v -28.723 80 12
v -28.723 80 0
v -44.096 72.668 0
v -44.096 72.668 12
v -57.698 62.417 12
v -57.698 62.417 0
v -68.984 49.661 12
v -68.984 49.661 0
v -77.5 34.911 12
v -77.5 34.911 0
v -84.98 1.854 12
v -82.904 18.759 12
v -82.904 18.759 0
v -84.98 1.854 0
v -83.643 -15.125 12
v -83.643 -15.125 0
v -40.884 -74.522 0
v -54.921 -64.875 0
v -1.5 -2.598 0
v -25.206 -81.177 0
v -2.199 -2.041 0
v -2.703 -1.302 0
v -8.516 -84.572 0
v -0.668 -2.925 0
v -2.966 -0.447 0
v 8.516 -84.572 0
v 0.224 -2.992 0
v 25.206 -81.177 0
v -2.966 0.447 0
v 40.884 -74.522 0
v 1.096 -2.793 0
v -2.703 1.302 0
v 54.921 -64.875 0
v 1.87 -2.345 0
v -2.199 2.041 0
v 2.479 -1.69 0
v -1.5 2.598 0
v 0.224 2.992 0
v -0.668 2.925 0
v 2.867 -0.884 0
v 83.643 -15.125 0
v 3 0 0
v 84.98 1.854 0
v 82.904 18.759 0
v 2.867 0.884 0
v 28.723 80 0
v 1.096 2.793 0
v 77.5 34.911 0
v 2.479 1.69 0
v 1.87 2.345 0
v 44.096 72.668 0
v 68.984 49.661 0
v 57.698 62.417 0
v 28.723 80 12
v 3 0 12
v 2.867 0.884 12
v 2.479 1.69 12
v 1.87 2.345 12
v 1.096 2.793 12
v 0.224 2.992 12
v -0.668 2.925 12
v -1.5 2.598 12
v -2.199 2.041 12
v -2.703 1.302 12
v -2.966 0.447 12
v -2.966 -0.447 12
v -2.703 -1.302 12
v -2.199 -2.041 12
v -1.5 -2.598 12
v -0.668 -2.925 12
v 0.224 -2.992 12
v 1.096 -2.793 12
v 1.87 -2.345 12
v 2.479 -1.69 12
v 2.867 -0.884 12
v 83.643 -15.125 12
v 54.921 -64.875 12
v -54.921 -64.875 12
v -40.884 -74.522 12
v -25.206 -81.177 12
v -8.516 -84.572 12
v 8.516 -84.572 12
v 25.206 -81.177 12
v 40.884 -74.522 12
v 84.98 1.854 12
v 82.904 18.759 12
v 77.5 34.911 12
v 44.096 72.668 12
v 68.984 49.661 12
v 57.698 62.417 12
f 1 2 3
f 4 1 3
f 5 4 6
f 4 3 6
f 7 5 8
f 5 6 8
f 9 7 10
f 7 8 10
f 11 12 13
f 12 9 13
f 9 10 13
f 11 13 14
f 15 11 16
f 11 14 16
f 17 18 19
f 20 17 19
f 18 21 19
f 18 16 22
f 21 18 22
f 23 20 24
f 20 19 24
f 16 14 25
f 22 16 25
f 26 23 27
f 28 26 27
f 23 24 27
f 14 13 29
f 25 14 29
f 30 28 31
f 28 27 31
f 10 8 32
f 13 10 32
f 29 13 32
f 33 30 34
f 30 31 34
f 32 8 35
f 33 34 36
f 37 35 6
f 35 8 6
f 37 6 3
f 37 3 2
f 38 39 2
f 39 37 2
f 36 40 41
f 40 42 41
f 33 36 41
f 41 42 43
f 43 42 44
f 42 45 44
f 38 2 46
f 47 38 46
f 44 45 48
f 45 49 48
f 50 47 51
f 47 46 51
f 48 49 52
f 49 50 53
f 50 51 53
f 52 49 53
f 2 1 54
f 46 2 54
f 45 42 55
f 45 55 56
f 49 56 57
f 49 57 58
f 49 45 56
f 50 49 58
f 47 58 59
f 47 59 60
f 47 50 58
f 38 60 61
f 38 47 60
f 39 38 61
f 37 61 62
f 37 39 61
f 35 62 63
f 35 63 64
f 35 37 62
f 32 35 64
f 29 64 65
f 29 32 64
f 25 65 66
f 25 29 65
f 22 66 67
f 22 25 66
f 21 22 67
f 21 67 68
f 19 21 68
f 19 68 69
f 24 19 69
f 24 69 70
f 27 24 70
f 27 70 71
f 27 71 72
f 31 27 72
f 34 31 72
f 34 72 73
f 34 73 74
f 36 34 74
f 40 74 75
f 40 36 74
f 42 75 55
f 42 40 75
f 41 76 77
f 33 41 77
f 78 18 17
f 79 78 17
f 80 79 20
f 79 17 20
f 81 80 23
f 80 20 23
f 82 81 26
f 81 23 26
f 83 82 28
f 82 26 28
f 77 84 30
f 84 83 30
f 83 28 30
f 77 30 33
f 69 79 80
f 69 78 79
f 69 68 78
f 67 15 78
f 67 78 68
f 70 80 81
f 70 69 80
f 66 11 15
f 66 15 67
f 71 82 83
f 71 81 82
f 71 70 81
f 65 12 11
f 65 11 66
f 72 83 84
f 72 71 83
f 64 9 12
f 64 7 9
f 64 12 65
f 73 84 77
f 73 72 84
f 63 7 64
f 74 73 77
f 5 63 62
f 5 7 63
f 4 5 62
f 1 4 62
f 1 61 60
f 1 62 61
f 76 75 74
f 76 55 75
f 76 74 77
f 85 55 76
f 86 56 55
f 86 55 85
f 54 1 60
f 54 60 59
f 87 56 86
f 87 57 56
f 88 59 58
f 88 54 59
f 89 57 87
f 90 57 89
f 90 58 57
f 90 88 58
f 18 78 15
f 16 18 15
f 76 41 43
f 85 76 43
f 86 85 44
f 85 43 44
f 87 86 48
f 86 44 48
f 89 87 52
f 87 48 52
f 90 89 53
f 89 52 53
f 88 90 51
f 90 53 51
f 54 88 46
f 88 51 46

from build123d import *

# Parameters (mm, degrees)
SKETCH1_R           = 85
SKETCH1_R_2         = 3
BOSS_EXTRUDE1_DEPTH = 12
CUT_EXTRUDE1_DEPTH  = 12
CIRPATTERN1_COUNT   = 3


with BuildPart() as part:
    # Sketch1 → Boss-Extrude1 (new body)
    with BuildSketch(Plane.XY):
        Circle(SKETCH1_R)
        Circle(SKETCH1_R_2, mode=Mode.SUBTRACT)
    extrude(amount=BOSS_EXTRUDE1_DEPTH)

    # Sketch2 → Cut-Extrude1 (cut)
    with BuildSketch(Plane.XY.offset(12)):
        with BuildLine():
            Line((-28.722813233, 80), (28.722813233, 80))
            ThreePointArc((28.722813233, 80), (0, 85), (-28.722813233, 80))
        make_face()
    cut_extrude1 = extrude(amount=-CUT_EXTRUDE1_DEPTH, mode=Mode.SUBTRACT)

    # CirPattern1: Cut-Extrude1 ×3 about axis
    cirpattern1_axis = Axis((0, 0, 0), (0, 0, 1))
    for i in range(1, CIRPATTERN1_COUNT):
        add(cut_extrude1.rotate(cirpattern1_axis, i * 360 / CIRPATTERN1_COUNT), mode=Mode.SUBTRACT)


solid = part.part
